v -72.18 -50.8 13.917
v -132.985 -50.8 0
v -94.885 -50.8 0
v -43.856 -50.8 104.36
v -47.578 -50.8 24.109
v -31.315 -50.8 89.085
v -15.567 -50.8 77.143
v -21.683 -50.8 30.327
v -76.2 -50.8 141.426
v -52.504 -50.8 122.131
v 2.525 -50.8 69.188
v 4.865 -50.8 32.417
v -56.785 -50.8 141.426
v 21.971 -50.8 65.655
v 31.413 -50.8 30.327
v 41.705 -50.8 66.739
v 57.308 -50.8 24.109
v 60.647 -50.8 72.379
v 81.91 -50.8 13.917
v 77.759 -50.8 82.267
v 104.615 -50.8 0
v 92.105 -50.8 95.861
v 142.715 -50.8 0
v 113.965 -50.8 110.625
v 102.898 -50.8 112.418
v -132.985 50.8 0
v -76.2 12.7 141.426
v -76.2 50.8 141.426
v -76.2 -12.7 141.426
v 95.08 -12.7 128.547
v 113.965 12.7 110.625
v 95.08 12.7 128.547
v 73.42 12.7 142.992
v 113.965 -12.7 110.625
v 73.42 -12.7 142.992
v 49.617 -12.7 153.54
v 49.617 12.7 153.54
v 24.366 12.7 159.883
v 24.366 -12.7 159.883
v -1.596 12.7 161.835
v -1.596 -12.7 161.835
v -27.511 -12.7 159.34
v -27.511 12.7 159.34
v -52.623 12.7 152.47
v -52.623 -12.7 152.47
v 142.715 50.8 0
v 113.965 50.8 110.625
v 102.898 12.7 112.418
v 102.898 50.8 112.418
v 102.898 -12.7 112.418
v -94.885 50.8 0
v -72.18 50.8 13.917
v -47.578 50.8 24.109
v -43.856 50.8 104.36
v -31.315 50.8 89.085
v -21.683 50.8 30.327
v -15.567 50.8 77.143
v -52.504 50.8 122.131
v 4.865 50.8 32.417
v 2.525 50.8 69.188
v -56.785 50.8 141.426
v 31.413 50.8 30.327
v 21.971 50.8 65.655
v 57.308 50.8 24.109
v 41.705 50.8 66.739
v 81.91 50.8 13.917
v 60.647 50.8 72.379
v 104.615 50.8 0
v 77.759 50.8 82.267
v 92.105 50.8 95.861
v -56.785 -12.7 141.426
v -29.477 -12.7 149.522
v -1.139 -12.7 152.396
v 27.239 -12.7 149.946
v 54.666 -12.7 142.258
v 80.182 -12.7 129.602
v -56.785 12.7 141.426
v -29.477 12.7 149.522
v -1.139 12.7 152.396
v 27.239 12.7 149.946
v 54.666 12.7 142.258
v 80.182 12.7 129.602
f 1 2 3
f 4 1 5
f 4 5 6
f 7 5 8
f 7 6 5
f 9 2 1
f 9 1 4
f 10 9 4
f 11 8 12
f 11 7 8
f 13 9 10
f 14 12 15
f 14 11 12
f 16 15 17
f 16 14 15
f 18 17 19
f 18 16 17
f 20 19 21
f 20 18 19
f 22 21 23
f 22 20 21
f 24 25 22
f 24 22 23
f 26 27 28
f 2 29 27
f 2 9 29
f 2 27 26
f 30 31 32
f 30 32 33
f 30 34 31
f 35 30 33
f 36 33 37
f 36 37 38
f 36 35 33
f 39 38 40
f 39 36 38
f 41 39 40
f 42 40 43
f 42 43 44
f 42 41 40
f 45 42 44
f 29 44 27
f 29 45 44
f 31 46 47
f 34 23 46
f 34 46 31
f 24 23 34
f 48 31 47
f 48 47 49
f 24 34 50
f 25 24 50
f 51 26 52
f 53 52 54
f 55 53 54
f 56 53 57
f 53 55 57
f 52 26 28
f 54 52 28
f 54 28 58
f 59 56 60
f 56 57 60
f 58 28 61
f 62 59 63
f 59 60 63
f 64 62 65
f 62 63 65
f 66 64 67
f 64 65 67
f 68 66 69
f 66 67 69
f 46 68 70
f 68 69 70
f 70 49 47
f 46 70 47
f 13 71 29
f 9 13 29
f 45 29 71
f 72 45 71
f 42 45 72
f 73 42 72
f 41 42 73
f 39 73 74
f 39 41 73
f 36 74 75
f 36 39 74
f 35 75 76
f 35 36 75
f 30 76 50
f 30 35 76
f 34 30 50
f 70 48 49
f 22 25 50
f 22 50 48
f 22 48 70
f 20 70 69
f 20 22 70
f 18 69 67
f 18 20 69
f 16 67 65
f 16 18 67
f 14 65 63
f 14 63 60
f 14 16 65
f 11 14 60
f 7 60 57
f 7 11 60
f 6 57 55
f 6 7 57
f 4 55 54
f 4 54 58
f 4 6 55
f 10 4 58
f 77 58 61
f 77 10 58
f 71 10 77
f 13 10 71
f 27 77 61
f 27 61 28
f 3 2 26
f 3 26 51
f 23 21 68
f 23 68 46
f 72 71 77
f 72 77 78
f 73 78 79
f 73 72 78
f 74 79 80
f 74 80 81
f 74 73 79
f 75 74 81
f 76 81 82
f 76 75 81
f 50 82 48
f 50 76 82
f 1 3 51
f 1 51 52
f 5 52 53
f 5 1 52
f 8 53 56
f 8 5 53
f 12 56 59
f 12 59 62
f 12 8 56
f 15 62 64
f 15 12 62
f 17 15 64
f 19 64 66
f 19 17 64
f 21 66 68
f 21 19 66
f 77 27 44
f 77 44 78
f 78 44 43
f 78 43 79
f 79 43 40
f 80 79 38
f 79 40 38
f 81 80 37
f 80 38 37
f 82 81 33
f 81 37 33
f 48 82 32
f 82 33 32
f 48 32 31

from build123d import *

# Parameters (mm, degrees)
F1_DEPTH      = 12.7
F1_DEPTH_BACK = 12.7
F3_DEPTH      = 50.8
F3_DEPTH_BACK = 50.8


with BuildPart() as f1:
    # F0 (on Front) → F1 (new body, two sides)
    with BuildSketch(Plane.XZ) as f1_sk:
        with BuildLine():
            ThreePointArc((113.964987, 110.625142), (24.366307, 159.882915), (-76.2, 141.425687))
            Line((-76.2, 141.425687), (-56.78499, 141.425687))
            ThreePointArc((-56.78499, 141.425687), (27.239214, 149.945941), (102.898219, 112.417598))
            Line((102.898219, 112.417598), (113.964987, 110.625142))
        make_face()
    extrude(amount=F1_DEPTH)
    extrude(f1_sk.sketch, amount=-F1_DEPTH_BACK)

    # F2 (on Front) → F3 (join, two sides)
    with BuildSketch(Plane.XZ) as f3_sk:
        with BuildLine():
            Line((113.964987, 110.625142), (102.898219, 112.417598))
            ThreePointArc((102.898219, 112.417598), (12.144134, 66.850814), (-56.78499, 141.425687))
            Line((-56.78499, 141.425687), (-76.2, 141.425687))
            Line((-76.2, 141.425687), (-132.98499, 0))
            Line((-132.98499, 0), (-94.88499, 0))
            ThreePointArc((-94.88499, 0), (4.865045, 32.416786), (104.615081, 0))
            Line((104.615081, 0), (142.715081, 0))
            Line((142.715081, 0), (113.964987, 110.625142))
        make_face()
    extrude(amount=F3_DEPTH)
    extrude(f3_sk.sketch, amount=-F3_DEPTH_BACK)


solid = f1.part
